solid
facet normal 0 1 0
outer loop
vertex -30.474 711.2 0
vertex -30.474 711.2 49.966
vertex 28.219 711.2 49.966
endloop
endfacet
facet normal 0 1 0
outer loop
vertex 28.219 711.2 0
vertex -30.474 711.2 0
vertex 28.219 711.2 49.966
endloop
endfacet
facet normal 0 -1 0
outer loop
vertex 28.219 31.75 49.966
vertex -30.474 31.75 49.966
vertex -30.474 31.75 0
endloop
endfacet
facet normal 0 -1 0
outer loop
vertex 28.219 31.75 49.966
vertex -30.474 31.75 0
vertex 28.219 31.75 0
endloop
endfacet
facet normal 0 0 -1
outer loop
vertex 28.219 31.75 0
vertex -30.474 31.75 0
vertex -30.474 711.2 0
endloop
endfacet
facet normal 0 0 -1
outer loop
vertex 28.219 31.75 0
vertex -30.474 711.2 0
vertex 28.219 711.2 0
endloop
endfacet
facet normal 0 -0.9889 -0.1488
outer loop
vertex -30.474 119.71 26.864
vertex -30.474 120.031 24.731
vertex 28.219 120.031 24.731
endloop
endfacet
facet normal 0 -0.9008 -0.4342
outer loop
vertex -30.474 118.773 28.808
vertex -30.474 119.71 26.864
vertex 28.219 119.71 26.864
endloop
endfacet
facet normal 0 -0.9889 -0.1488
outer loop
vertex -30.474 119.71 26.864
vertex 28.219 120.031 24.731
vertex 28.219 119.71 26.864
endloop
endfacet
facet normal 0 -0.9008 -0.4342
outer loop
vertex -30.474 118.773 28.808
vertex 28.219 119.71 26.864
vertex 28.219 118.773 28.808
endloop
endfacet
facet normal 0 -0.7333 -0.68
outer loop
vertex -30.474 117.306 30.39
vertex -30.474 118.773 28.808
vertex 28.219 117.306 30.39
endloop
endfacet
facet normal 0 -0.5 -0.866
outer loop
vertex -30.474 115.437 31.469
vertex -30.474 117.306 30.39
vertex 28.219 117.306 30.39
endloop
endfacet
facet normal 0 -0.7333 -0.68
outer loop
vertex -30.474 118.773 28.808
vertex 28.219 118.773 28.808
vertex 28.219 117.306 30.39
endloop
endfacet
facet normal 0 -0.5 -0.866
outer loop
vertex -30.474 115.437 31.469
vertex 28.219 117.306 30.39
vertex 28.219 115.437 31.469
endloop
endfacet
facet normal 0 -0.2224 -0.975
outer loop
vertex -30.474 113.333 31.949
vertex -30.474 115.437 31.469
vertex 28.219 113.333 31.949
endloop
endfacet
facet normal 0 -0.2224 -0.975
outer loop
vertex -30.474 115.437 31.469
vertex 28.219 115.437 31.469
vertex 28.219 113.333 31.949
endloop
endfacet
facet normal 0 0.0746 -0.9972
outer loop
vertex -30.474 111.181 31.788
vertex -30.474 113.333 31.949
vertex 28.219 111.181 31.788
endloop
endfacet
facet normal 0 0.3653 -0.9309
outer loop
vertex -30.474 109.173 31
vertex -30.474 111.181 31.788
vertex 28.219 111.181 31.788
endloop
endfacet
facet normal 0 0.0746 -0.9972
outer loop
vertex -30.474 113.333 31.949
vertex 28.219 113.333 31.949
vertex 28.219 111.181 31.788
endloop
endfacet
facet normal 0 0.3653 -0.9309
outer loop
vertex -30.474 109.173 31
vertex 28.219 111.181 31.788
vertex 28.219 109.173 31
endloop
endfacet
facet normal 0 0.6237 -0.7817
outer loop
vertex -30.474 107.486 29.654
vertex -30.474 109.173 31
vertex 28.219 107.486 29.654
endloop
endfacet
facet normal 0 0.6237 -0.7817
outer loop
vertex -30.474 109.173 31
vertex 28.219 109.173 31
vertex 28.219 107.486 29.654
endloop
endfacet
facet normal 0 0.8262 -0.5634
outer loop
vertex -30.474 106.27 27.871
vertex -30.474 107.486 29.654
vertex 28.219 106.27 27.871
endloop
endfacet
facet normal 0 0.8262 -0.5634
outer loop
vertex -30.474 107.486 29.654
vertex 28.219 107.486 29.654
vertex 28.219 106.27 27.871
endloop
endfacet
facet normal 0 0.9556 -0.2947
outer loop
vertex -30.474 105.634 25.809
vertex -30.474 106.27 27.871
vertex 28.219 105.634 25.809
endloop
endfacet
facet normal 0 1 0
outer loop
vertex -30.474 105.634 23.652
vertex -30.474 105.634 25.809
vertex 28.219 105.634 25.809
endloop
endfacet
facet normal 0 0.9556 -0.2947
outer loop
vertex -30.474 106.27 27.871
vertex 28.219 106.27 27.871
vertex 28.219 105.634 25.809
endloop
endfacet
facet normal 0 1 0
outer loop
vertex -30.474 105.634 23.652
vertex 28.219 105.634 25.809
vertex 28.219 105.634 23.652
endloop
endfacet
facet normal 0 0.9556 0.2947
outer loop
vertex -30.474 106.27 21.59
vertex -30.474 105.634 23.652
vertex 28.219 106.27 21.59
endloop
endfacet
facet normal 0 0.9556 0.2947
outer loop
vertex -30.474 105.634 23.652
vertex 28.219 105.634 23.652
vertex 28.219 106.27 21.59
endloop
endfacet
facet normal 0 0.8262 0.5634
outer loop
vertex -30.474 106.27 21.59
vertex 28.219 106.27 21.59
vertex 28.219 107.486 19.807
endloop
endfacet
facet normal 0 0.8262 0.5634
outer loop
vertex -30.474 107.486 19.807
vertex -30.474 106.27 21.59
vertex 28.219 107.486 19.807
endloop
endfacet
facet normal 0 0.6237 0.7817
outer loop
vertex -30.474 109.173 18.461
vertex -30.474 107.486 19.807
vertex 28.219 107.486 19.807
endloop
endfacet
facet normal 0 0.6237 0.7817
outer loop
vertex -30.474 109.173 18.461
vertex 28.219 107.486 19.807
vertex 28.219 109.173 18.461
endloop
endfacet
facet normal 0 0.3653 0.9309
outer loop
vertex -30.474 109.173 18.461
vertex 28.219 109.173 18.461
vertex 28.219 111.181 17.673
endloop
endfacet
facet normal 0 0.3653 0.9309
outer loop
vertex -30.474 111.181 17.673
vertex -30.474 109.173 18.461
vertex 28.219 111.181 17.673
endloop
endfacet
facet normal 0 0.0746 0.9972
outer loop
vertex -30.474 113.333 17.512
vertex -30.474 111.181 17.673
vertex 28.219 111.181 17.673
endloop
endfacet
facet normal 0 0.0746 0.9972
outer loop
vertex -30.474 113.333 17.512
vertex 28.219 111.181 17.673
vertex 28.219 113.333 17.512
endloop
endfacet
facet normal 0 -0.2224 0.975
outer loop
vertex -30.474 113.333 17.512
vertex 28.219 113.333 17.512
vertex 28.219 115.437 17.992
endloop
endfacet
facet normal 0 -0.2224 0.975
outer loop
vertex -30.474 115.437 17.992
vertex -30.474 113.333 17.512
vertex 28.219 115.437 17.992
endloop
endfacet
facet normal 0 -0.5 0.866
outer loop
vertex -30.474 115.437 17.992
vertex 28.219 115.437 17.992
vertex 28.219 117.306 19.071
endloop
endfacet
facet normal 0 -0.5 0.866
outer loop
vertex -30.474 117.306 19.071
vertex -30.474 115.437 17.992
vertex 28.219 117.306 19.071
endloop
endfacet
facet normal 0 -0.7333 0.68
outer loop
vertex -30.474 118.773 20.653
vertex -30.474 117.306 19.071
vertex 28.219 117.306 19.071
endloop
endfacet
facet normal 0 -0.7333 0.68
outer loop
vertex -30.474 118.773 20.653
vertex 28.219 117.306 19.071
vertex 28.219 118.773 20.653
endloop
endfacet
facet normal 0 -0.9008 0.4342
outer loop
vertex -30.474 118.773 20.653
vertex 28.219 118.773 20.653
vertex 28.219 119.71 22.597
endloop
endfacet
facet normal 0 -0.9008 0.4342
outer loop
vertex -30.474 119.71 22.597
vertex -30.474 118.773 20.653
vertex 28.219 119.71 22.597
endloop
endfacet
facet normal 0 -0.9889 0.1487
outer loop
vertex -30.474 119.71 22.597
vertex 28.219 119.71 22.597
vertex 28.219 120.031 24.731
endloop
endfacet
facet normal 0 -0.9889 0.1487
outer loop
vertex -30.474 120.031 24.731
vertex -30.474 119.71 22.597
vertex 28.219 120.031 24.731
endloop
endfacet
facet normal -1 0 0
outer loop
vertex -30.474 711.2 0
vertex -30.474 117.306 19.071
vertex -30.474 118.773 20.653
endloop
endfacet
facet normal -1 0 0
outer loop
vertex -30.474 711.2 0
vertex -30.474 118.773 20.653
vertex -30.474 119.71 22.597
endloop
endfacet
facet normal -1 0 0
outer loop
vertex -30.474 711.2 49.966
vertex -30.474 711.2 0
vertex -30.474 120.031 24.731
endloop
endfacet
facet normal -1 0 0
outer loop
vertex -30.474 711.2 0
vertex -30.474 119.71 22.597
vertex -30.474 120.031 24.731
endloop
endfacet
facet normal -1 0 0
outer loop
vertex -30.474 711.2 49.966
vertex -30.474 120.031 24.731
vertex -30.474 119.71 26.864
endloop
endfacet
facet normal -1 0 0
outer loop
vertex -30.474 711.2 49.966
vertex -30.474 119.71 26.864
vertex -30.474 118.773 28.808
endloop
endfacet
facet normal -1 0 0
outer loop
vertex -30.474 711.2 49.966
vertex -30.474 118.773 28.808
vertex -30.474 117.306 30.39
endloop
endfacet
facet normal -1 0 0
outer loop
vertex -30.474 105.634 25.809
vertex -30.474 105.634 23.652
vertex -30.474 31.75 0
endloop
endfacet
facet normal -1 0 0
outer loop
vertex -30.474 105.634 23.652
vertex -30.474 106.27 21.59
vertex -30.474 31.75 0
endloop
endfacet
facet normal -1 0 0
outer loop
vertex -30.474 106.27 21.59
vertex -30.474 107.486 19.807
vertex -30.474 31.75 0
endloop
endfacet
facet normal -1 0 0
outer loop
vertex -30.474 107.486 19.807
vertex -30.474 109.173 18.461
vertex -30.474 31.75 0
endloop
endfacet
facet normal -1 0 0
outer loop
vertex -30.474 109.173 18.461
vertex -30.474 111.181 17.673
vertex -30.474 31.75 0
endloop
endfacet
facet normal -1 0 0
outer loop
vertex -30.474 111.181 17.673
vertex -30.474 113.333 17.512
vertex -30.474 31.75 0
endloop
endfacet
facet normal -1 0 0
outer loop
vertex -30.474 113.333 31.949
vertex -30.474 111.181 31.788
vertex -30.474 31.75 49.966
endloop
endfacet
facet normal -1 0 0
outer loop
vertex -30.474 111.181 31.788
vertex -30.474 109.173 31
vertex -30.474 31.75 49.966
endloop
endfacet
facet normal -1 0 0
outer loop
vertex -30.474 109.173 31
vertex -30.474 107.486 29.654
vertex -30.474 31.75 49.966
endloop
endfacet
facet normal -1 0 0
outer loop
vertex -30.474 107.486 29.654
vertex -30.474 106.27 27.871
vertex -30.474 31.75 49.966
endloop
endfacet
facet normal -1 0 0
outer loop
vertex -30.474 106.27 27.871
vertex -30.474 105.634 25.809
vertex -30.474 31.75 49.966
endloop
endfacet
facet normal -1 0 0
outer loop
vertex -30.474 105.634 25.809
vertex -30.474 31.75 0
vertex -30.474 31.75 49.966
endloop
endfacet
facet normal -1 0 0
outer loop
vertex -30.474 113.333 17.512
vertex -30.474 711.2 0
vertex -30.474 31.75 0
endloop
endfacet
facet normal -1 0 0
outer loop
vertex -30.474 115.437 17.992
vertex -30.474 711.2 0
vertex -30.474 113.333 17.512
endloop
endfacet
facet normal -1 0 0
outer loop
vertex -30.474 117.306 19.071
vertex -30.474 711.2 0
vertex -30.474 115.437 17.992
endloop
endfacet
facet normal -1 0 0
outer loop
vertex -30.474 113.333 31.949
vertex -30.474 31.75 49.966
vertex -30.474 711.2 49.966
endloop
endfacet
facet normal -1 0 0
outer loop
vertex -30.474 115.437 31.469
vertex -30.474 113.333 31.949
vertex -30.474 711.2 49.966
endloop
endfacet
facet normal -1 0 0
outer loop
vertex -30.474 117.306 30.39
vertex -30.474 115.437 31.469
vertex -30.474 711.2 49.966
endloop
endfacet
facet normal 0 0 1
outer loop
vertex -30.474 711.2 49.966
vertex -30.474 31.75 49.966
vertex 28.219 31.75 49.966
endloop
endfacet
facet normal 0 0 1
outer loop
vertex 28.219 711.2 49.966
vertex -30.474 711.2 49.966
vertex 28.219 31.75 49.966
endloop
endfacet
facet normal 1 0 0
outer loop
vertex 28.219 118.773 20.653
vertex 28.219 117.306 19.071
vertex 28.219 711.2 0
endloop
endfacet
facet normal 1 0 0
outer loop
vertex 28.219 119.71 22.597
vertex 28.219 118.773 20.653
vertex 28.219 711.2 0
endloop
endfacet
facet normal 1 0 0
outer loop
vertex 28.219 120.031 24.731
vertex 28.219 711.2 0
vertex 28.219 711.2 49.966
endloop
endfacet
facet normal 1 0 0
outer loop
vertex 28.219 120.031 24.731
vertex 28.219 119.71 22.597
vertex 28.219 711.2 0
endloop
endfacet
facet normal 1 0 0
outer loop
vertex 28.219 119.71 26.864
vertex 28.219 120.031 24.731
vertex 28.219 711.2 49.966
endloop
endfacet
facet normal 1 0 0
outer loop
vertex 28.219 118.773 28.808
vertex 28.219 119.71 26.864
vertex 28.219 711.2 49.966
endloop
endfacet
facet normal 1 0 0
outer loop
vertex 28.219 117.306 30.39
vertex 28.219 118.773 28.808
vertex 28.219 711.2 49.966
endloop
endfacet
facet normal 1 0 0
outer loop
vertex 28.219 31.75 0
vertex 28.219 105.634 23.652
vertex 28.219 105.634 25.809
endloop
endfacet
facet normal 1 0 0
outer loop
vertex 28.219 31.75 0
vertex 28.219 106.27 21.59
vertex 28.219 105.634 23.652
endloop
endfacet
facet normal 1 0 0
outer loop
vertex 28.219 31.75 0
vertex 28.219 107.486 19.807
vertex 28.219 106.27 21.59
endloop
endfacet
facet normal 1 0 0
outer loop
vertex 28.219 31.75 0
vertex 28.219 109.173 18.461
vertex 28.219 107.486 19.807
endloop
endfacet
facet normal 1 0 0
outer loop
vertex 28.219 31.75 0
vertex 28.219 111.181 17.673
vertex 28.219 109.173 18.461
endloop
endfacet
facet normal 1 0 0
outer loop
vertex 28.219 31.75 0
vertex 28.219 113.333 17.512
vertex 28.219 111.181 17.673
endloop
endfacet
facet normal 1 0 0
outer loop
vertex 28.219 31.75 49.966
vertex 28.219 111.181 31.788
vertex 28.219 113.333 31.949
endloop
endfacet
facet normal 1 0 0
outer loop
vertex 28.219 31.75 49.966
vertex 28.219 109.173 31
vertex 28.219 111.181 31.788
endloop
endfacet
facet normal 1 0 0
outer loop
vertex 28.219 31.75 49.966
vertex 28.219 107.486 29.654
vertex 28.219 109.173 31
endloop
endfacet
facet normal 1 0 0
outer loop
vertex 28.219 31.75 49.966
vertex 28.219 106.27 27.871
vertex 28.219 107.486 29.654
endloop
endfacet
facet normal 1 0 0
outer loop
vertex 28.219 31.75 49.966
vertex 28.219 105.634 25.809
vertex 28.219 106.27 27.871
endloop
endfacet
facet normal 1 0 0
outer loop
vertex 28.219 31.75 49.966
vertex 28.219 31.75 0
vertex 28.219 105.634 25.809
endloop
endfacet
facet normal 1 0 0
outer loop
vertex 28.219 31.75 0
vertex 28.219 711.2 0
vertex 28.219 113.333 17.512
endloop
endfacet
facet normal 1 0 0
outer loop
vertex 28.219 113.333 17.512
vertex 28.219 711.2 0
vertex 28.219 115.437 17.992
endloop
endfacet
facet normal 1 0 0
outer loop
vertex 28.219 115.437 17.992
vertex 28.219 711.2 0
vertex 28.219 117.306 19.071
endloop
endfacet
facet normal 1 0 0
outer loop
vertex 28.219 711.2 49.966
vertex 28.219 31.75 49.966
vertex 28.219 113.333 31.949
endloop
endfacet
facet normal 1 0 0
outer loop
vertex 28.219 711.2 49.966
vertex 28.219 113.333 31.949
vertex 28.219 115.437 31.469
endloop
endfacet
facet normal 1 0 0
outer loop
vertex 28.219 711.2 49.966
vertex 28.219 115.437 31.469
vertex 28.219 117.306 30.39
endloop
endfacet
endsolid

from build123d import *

# Parameters (mm, degrees)
F1_START = -31.75
F0_W     = 58.6923658848
F0_H     = 49.9662607908
F1_DEPTH = 679.45
F4_D     = 14.478


with BuildPart() as f1:
    # F0 (on Front) → F1 (new body)
    with BuildSketch(Plane.XZ.offset(F1_START)):
        with Locations((-1.1275112629, 24.9831303954)):
            Rectangle(F0_W, F0_H)
    extrude(amount=-F1_DEPTH)

    # F4 (through all)
    with Locations(Plane(origin=(-30.4736942053, 0, 0), x_dir=(0, -1, 0), z_dir=(-1, 0, 0))):
        with Locations((-112.7921268344, 24.7305184603)):
            Hole(F4_D / 2)


solid = f1.part
